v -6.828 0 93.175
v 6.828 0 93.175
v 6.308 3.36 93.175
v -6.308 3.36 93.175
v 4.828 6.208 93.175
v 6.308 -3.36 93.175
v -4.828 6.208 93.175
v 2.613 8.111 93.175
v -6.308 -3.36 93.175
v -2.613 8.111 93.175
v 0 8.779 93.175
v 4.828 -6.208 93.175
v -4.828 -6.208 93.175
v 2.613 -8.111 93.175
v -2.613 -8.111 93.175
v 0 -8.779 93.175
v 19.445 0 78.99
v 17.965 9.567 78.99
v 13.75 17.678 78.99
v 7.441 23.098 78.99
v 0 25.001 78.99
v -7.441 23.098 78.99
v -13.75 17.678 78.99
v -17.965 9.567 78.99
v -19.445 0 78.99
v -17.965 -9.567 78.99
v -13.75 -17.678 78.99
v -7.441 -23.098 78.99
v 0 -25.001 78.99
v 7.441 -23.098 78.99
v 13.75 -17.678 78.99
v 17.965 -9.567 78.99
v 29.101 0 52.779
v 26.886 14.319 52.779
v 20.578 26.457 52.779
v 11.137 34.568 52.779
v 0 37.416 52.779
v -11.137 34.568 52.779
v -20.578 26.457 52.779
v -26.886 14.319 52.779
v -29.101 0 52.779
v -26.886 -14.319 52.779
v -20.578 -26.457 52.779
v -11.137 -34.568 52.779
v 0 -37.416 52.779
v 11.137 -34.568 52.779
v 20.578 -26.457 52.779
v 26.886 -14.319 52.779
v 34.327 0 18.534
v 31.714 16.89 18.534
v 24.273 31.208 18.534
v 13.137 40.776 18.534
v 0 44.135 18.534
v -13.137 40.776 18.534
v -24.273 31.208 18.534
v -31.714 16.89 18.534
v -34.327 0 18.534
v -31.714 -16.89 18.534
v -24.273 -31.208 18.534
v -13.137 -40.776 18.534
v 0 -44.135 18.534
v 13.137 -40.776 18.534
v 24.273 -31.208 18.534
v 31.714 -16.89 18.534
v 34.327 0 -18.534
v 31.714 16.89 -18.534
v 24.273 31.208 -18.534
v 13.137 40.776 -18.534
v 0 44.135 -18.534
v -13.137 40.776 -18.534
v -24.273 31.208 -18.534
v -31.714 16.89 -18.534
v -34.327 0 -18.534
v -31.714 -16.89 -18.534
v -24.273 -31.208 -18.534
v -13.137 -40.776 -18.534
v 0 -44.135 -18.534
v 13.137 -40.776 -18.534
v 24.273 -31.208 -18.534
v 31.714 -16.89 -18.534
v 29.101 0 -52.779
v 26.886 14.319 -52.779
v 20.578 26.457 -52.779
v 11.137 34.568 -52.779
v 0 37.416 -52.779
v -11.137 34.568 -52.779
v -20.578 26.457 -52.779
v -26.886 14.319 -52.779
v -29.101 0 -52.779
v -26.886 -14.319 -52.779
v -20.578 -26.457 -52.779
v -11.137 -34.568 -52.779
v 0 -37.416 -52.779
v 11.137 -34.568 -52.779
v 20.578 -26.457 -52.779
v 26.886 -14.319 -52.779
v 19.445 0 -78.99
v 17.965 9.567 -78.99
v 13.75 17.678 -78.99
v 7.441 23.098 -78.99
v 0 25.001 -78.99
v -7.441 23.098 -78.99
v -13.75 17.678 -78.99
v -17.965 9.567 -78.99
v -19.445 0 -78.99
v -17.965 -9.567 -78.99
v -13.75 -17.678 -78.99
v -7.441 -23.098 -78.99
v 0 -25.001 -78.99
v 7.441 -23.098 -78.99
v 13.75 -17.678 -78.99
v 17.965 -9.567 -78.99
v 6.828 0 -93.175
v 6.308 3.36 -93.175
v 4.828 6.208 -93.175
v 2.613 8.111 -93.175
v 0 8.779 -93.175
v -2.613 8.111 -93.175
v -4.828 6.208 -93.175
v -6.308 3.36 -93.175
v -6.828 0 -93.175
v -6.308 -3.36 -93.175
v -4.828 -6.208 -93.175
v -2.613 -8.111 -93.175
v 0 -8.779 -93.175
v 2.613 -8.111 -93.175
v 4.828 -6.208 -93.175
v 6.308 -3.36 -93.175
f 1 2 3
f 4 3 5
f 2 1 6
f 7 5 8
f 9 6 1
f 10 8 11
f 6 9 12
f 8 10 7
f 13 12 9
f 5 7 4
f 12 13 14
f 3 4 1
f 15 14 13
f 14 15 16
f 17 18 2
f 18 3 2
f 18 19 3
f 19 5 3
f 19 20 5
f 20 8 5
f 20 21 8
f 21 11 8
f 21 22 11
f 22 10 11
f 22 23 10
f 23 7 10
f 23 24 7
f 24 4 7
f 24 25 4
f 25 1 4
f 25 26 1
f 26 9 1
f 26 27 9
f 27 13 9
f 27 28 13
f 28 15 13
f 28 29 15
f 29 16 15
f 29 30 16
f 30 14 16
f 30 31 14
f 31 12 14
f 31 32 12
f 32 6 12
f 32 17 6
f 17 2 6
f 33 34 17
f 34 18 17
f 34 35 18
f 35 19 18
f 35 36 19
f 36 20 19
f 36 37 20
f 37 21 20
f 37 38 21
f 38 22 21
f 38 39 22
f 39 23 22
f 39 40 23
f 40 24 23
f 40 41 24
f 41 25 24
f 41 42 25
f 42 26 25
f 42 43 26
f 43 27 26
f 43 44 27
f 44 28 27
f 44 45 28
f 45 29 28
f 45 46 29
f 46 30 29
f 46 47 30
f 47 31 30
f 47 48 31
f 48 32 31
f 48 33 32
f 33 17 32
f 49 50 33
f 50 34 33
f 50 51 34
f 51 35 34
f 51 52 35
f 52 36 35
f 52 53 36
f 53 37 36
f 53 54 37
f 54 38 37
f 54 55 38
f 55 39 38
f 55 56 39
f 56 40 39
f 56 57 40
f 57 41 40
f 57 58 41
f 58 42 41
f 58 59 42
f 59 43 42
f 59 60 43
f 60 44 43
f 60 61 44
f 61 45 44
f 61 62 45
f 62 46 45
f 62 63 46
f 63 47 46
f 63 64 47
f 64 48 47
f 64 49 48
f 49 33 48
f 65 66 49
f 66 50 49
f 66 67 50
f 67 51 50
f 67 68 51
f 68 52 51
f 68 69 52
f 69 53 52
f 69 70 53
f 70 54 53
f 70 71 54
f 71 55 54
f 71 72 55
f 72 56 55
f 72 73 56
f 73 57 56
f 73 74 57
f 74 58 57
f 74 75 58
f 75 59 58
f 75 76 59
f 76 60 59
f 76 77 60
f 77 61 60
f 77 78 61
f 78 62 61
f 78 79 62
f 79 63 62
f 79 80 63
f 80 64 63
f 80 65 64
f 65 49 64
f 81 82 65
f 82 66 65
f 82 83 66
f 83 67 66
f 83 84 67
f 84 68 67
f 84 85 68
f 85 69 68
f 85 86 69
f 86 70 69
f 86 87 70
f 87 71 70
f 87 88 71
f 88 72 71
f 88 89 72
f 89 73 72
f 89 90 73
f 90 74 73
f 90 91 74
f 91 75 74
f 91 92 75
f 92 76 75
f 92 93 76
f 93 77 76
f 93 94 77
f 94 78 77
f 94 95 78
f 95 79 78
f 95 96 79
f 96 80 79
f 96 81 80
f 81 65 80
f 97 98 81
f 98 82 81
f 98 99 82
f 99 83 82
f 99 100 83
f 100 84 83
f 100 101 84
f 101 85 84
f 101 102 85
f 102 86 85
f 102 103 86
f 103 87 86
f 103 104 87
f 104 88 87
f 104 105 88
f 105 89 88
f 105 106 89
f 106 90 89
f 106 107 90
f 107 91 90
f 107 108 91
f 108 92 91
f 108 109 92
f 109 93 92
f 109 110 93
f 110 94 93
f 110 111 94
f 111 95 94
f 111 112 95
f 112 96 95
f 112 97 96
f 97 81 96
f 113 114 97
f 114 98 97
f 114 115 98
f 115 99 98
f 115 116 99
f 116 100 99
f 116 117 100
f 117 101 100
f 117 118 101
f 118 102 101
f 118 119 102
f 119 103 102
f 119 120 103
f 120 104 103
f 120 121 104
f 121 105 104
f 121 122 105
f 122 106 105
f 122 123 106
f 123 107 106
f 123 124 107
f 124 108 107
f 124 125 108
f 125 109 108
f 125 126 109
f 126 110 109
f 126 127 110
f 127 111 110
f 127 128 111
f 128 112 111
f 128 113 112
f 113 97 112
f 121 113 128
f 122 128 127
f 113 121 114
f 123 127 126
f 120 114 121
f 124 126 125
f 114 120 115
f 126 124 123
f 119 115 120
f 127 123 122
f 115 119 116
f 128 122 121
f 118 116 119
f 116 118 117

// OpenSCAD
// Generated by SolidPython 1.0.1 on 2020-07-29 00:46:47


scale(v = [7, 9, 19]) {
	sphere(r = 5);
}
/***********************************************
*********      SolidPython code:      **********
************************************************
 
# import packages: SolidPython
from solid import *
from solid.utils import *
from itertools import chain, combinations, permutations


class Resize:

    def __init__(self, scad_file):
        self.scad_file = scad_file
        #self.scad_file = import_scad(scad_file)
        # cone/cylinder param:
        self.r1 = 0
        self.r2 = 0
        self.h = 0
        # rectangular prism param:
        self.w = 0
        self.l = 0
        # ellipse param:
        self.r = 0

    # import OpenScad code (file name corresponds to shape)


    # classify shape + parameters
    def assign(self, param1, param2, param3):
        if self.scad_file == 'cone.scad':
            self.r1 = param1
            self.r2 = param2
            self.h = param3
        elif self.scad_file == 'cylinder.scad':
            self.r1 = param1
            self.r2 = param2
            self.h = param3
        elif self.scad_file == 'rectangularPrism.scad':
            self.h = param1
            self.l = param2
            self.w = param3
        else:
            self.r = param1
            self.h = param2

    # resize parameters
    def iterate(self):
        x = range(3, 20, 2)
        i = 1
        if self.scad_file == 'cone.scad':
            tempList = list(permutations(x, 2))
            for temp in tempList:
                param1 = temp[0]
                param2 = temp[1]
                filepath = 'produced_scad_files/' + 'cone' + str(param1) + '_' + str(param2) + '_' + '.scad'
                scad_render_to_file(cylinder(h=param1, r1=param2, r2=0), filepath)

        elif self.scad_file == 'cylinder.scad':
            tempList = list(permutations(x, 3))
            for temp in tempList:
                param1 = temp[0]
                param2 = temp[1]
                filepath = 'produced_scad_files/' + 'cylinder' + str(param1) + '_' + str(param2) + '_' + '.scad'
                scad_render_to_file(cylinder(h=param1, r1=param2, r2=param2), filepath)

        elif self.scad_file == 'rectangularPrism.scad':
            tempList = list(permutations(x, 3))
            for temp in tempList:
                param1 = temp[0]
                param2 = temp[1]
                param3 = temp[2]
                filepath = 'produced_scad_files/' + 'rectangularPrism' + str(param1) + '_' + str(param2) + '_' + str(
                    param3) + '.scad'
                scad_render_to_file(cube(size=(param1, param2, param3)), filepath)

        elif self.scad_file == 'ellipse.scad':
            tempList = list(permutations(x, 4))
            for temp in tempList:
                param1 = temp[0]
                param2 = temp[1]
                param3 = temp[2]
                param4 = temp[3]
                filepath = 'produced_scad_files/' + 'ellipse' + str(param1) + '_' + str(param2) + '_' + str(param3) + '_' + str(param4) + '.scad'
                scad_render_to_file(scale([param1, param2, param3])(sphere(r=param4)), filepath)

    def render_to_scadfile(self):
        scad_render_to_file(scad, 'example.scad') 
 
************************************************/
